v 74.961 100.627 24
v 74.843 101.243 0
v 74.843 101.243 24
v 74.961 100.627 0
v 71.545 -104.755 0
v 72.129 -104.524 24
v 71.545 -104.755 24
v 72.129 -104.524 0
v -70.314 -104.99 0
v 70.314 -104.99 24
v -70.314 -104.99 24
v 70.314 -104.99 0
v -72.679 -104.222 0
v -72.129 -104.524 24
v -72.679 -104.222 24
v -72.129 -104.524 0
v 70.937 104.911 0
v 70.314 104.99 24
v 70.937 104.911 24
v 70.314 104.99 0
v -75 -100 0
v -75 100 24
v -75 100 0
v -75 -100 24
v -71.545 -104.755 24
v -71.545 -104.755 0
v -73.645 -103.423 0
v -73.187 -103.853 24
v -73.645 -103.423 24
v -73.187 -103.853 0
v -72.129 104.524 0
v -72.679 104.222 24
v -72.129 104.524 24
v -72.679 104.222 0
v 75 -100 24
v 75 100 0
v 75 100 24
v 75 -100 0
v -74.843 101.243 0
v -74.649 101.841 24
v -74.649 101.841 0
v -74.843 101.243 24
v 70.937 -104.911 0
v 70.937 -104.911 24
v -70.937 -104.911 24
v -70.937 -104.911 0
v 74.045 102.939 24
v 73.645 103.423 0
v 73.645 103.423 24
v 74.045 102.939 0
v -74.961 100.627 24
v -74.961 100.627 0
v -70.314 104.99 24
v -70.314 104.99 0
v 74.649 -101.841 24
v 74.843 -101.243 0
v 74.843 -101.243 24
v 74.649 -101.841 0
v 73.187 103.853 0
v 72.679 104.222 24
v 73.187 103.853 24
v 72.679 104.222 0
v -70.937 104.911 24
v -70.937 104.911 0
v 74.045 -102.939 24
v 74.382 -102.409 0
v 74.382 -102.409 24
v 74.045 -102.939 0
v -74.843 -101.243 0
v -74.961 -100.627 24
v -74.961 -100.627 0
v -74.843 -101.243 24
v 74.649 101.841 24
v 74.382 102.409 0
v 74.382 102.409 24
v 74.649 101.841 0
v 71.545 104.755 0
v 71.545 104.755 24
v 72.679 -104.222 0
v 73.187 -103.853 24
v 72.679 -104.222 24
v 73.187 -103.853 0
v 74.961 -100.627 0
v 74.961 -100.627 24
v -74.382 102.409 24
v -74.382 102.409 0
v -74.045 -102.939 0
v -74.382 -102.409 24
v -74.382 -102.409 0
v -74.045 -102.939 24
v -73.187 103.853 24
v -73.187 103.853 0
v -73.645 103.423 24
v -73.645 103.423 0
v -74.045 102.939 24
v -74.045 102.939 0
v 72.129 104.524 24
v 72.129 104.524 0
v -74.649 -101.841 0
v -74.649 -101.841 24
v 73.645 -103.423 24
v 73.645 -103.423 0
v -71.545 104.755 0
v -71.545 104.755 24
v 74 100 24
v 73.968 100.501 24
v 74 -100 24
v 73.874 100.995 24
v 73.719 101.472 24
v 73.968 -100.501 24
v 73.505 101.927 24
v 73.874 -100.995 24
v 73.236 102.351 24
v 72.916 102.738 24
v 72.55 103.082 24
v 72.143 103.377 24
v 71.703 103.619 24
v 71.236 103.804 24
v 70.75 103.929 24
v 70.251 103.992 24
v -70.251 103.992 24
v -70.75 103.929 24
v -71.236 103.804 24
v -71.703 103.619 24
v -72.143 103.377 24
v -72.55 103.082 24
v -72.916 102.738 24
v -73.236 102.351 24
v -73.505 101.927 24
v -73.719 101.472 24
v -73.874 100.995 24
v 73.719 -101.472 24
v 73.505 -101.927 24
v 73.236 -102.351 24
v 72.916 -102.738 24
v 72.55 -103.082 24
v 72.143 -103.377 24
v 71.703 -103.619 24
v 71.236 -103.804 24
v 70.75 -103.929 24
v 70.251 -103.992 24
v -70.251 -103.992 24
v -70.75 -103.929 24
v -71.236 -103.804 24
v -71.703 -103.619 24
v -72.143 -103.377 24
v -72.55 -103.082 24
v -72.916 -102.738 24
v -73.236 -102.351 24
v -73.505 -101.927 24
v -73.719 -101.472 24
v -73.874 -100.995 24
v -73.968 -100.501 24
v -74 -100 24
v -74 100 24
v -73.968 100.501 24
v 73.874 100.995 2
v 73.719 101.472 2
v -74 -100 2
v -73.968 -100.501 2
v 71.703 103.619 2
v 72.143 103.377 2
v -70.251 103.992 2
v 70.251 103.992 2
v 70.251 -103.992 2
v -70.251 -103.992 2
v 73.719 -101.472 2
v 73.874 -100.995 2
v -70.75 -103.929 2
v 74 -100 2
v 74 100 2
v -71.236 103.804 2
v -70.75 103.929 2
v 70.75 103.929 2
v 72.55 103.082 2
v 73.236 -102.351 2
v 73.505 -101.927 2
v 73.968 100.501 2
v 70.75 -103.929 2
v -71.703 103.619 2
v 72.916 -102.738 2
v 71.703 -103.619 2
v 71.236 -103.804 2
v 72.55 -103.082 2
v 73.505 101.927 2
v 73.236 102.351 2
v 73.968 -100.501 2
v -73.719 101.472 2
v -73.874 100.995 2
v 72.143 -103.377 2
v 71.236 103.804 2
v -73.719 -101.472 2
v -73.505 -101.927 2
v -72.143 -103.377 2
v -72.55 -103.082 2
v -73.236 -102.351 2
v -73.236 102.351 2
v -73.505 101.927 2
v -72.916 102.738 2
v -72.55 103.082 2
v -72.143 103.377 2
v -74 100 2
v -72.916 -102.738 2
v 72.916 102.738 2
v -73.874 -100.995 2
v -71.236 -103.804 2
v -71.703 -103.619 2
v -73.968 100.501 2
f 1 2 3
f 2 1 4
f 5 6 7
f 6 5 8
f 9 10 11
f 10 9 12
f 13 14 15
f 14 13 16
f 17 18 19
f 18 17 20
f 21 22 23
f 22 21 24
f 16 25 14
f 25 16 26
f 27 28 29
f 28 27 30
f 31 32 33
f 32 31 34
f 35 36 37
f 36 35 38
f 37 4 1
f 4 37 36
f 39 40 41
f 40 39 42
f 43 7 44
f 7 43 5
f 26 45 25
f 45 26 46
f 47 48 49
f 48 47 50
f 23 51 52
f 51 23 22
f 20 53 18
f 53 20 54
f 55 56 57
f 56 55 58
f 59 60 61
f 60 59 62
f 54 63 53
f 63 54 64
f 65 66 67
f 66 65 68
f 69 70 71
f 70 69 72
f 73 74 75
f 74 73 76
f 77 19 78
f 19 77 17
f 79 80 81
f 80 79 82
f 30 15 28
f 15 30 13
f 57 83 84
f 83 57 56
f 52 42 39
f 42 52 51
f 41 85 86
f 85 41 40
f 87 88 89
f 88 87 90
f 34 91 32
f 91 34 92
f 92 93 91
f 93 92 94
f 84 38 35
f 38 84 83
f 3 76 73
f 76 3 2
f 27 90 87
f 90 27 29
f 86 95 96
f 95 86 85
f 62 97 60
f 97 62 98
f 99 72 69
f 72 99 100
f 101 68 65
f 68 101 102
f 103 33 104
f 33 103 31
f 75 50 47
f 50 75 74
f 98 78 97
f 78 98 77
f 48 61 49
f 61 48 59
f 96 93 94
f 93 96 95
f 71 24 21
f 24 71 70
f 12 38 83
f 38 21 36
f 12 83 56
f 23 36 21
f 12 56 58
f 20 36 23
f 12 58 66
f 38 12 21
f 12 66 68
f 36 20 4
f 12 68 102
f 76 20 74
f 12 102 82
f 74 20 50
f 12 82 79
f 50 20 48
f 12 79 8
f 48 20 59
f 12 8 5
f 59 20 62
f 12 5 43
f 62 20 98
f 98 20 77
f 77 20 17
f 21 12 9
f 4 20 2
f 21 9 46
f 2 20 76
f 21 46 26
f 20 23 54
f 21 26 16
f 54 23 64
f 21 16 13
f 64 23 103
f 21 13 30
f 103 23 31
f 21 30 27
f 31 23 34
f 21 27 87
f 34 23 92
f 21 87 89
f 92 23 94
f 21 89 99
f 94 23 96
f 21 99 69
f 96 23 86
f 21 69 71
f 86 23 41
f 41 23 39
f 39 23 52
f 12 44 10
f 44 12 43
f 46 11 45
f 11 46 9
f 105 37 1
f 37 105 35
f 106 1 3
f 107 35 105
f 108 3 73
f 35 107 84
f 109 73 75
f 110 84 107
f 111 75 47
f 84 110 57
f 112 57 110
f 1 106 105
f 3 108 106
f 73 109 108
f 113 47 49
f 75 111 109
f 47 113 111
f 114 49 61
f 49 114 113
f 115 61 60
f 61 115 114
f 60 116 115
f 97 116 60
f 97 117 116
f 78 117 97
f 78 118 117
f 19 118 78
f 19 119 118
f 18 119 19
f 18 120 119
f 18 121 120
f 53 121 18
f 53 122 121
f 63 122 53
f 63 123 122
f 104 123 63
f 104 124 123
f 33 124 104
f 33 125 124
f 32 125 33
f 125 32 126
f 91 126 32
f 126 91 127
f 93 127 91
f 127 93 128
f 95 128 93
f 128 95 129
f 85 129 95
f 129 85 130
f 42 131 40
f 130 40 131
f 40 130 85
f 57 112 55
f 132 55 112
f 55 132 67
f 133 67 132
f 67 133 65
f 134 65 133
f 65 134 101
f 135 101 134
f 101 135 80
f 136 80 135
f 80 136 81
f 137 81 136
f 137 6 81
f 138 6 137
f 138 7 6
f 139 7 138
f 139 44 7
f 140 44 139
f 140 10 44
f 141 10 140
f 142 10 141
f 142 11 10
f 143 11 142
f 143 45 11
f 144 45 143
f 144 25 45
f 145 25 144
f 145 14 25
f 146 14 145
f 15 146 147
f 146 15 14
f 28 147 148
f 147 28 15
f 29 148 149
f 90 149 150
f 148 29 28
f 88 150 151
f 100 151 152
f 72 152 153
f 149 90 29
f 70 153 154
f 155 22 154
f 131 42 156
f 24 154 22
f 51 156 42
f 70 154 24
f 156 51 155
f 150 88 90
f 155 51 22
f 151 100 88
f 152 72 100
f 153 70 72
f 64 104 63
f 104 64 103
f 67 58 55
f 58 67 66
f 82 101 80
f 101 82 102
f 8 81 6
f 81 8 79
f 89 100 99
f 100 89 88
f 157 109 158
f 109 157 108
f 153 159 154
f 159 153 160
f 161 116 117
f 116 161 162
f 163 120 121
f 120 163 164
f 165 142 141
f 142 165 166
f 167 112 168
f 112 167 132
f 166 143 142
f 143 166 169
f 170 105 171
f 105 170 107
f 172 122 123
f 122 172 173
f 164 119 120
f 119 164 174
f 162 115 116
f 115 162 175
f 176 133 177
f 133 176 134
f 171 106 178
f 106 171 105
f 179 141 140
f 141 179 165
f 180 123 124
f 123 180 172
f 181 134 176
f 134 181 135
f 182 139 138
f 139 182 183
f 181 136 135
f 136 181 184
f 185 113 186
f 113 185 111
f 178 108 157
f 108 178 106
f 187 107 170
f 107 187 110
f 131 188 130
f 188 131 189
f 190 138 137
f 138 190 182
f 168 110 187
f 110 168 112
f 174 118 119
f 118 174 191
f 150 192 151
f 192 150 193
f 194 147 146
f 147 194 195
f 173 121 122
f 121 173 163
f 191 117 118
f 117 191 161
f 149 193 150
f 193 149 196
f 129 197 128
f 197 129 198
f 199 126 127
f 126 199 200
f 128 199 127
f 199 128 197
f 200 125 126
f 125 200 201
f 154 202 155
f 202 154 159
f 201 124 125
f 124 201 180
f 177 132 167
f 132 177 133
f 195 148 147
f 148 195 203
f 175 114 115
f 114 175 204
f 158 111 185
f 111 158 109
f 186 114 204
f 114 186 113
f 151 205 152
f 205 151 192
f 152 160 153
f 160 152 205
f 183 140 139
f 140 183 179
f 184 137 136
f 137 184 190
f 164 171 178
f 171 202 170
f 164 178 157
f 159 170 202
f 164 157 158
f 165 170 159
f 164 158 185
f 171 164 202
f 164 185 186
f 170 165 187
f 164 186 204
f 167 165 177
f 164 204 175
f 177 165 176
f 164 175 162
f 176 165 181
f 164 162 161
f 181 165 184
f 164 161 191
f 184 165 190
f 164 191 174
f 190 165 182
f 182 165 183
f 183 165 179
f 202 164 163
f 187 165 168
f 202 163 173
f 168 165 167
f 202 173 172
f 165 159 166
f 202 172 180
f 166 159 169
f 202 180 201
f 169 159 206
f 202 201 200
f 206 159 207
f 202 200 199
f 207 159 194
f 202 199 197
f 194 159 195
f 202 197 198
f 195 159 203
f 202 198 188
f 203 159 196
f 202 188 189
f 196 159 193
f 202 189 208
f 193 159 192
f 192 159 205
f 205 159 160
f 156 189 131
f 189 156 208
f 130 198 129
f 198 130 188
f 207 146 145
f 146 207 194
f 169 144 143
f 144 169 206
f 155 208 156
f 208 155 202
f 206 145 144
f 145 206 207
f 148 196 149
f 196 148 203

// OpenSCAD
$fn = 50;


difference() {
	union() {
		hull() {
			translate(v = [-70.0000000000, 100.0000000000, 0]) {
				cylinder(h = 24, r = 5);
			}
			translate(v = [70.0000000000, 100.0000000000, 0]) {
				cylinder(h = 24, r = 5);
			}
			translate(v = [-70.0000000000, -100.0000000000, 0]) {
				cylinder(h = 24, r = 5);
			}
			translate(v = [70.0000000000, -100.0000000000, 0]) {
				cylinder(h = 24, r = 5);
			}
		}
	}
	union() {
		translate(v = [0, 0, 2]) {
			hull() {
				translate(v = [-70.0000000000, 100.0000000000, 0]) {
					cylinder(h = 22, r = 4);
				}
				translate(v = [70.0000000000, 100.0000000000, 0]) {
					cylinder(h = 22, r = 4);
				}
				translate(v = [-70.0000000000, -100.0000000000, 0]) {
					cylinder(h = 22, r = 4);
				}
				translate(v = [70.0000000000, -100.0000000000, 0]) {
					cylinder(h = 22, r = 4);
				}
			}
		}
	}
}
